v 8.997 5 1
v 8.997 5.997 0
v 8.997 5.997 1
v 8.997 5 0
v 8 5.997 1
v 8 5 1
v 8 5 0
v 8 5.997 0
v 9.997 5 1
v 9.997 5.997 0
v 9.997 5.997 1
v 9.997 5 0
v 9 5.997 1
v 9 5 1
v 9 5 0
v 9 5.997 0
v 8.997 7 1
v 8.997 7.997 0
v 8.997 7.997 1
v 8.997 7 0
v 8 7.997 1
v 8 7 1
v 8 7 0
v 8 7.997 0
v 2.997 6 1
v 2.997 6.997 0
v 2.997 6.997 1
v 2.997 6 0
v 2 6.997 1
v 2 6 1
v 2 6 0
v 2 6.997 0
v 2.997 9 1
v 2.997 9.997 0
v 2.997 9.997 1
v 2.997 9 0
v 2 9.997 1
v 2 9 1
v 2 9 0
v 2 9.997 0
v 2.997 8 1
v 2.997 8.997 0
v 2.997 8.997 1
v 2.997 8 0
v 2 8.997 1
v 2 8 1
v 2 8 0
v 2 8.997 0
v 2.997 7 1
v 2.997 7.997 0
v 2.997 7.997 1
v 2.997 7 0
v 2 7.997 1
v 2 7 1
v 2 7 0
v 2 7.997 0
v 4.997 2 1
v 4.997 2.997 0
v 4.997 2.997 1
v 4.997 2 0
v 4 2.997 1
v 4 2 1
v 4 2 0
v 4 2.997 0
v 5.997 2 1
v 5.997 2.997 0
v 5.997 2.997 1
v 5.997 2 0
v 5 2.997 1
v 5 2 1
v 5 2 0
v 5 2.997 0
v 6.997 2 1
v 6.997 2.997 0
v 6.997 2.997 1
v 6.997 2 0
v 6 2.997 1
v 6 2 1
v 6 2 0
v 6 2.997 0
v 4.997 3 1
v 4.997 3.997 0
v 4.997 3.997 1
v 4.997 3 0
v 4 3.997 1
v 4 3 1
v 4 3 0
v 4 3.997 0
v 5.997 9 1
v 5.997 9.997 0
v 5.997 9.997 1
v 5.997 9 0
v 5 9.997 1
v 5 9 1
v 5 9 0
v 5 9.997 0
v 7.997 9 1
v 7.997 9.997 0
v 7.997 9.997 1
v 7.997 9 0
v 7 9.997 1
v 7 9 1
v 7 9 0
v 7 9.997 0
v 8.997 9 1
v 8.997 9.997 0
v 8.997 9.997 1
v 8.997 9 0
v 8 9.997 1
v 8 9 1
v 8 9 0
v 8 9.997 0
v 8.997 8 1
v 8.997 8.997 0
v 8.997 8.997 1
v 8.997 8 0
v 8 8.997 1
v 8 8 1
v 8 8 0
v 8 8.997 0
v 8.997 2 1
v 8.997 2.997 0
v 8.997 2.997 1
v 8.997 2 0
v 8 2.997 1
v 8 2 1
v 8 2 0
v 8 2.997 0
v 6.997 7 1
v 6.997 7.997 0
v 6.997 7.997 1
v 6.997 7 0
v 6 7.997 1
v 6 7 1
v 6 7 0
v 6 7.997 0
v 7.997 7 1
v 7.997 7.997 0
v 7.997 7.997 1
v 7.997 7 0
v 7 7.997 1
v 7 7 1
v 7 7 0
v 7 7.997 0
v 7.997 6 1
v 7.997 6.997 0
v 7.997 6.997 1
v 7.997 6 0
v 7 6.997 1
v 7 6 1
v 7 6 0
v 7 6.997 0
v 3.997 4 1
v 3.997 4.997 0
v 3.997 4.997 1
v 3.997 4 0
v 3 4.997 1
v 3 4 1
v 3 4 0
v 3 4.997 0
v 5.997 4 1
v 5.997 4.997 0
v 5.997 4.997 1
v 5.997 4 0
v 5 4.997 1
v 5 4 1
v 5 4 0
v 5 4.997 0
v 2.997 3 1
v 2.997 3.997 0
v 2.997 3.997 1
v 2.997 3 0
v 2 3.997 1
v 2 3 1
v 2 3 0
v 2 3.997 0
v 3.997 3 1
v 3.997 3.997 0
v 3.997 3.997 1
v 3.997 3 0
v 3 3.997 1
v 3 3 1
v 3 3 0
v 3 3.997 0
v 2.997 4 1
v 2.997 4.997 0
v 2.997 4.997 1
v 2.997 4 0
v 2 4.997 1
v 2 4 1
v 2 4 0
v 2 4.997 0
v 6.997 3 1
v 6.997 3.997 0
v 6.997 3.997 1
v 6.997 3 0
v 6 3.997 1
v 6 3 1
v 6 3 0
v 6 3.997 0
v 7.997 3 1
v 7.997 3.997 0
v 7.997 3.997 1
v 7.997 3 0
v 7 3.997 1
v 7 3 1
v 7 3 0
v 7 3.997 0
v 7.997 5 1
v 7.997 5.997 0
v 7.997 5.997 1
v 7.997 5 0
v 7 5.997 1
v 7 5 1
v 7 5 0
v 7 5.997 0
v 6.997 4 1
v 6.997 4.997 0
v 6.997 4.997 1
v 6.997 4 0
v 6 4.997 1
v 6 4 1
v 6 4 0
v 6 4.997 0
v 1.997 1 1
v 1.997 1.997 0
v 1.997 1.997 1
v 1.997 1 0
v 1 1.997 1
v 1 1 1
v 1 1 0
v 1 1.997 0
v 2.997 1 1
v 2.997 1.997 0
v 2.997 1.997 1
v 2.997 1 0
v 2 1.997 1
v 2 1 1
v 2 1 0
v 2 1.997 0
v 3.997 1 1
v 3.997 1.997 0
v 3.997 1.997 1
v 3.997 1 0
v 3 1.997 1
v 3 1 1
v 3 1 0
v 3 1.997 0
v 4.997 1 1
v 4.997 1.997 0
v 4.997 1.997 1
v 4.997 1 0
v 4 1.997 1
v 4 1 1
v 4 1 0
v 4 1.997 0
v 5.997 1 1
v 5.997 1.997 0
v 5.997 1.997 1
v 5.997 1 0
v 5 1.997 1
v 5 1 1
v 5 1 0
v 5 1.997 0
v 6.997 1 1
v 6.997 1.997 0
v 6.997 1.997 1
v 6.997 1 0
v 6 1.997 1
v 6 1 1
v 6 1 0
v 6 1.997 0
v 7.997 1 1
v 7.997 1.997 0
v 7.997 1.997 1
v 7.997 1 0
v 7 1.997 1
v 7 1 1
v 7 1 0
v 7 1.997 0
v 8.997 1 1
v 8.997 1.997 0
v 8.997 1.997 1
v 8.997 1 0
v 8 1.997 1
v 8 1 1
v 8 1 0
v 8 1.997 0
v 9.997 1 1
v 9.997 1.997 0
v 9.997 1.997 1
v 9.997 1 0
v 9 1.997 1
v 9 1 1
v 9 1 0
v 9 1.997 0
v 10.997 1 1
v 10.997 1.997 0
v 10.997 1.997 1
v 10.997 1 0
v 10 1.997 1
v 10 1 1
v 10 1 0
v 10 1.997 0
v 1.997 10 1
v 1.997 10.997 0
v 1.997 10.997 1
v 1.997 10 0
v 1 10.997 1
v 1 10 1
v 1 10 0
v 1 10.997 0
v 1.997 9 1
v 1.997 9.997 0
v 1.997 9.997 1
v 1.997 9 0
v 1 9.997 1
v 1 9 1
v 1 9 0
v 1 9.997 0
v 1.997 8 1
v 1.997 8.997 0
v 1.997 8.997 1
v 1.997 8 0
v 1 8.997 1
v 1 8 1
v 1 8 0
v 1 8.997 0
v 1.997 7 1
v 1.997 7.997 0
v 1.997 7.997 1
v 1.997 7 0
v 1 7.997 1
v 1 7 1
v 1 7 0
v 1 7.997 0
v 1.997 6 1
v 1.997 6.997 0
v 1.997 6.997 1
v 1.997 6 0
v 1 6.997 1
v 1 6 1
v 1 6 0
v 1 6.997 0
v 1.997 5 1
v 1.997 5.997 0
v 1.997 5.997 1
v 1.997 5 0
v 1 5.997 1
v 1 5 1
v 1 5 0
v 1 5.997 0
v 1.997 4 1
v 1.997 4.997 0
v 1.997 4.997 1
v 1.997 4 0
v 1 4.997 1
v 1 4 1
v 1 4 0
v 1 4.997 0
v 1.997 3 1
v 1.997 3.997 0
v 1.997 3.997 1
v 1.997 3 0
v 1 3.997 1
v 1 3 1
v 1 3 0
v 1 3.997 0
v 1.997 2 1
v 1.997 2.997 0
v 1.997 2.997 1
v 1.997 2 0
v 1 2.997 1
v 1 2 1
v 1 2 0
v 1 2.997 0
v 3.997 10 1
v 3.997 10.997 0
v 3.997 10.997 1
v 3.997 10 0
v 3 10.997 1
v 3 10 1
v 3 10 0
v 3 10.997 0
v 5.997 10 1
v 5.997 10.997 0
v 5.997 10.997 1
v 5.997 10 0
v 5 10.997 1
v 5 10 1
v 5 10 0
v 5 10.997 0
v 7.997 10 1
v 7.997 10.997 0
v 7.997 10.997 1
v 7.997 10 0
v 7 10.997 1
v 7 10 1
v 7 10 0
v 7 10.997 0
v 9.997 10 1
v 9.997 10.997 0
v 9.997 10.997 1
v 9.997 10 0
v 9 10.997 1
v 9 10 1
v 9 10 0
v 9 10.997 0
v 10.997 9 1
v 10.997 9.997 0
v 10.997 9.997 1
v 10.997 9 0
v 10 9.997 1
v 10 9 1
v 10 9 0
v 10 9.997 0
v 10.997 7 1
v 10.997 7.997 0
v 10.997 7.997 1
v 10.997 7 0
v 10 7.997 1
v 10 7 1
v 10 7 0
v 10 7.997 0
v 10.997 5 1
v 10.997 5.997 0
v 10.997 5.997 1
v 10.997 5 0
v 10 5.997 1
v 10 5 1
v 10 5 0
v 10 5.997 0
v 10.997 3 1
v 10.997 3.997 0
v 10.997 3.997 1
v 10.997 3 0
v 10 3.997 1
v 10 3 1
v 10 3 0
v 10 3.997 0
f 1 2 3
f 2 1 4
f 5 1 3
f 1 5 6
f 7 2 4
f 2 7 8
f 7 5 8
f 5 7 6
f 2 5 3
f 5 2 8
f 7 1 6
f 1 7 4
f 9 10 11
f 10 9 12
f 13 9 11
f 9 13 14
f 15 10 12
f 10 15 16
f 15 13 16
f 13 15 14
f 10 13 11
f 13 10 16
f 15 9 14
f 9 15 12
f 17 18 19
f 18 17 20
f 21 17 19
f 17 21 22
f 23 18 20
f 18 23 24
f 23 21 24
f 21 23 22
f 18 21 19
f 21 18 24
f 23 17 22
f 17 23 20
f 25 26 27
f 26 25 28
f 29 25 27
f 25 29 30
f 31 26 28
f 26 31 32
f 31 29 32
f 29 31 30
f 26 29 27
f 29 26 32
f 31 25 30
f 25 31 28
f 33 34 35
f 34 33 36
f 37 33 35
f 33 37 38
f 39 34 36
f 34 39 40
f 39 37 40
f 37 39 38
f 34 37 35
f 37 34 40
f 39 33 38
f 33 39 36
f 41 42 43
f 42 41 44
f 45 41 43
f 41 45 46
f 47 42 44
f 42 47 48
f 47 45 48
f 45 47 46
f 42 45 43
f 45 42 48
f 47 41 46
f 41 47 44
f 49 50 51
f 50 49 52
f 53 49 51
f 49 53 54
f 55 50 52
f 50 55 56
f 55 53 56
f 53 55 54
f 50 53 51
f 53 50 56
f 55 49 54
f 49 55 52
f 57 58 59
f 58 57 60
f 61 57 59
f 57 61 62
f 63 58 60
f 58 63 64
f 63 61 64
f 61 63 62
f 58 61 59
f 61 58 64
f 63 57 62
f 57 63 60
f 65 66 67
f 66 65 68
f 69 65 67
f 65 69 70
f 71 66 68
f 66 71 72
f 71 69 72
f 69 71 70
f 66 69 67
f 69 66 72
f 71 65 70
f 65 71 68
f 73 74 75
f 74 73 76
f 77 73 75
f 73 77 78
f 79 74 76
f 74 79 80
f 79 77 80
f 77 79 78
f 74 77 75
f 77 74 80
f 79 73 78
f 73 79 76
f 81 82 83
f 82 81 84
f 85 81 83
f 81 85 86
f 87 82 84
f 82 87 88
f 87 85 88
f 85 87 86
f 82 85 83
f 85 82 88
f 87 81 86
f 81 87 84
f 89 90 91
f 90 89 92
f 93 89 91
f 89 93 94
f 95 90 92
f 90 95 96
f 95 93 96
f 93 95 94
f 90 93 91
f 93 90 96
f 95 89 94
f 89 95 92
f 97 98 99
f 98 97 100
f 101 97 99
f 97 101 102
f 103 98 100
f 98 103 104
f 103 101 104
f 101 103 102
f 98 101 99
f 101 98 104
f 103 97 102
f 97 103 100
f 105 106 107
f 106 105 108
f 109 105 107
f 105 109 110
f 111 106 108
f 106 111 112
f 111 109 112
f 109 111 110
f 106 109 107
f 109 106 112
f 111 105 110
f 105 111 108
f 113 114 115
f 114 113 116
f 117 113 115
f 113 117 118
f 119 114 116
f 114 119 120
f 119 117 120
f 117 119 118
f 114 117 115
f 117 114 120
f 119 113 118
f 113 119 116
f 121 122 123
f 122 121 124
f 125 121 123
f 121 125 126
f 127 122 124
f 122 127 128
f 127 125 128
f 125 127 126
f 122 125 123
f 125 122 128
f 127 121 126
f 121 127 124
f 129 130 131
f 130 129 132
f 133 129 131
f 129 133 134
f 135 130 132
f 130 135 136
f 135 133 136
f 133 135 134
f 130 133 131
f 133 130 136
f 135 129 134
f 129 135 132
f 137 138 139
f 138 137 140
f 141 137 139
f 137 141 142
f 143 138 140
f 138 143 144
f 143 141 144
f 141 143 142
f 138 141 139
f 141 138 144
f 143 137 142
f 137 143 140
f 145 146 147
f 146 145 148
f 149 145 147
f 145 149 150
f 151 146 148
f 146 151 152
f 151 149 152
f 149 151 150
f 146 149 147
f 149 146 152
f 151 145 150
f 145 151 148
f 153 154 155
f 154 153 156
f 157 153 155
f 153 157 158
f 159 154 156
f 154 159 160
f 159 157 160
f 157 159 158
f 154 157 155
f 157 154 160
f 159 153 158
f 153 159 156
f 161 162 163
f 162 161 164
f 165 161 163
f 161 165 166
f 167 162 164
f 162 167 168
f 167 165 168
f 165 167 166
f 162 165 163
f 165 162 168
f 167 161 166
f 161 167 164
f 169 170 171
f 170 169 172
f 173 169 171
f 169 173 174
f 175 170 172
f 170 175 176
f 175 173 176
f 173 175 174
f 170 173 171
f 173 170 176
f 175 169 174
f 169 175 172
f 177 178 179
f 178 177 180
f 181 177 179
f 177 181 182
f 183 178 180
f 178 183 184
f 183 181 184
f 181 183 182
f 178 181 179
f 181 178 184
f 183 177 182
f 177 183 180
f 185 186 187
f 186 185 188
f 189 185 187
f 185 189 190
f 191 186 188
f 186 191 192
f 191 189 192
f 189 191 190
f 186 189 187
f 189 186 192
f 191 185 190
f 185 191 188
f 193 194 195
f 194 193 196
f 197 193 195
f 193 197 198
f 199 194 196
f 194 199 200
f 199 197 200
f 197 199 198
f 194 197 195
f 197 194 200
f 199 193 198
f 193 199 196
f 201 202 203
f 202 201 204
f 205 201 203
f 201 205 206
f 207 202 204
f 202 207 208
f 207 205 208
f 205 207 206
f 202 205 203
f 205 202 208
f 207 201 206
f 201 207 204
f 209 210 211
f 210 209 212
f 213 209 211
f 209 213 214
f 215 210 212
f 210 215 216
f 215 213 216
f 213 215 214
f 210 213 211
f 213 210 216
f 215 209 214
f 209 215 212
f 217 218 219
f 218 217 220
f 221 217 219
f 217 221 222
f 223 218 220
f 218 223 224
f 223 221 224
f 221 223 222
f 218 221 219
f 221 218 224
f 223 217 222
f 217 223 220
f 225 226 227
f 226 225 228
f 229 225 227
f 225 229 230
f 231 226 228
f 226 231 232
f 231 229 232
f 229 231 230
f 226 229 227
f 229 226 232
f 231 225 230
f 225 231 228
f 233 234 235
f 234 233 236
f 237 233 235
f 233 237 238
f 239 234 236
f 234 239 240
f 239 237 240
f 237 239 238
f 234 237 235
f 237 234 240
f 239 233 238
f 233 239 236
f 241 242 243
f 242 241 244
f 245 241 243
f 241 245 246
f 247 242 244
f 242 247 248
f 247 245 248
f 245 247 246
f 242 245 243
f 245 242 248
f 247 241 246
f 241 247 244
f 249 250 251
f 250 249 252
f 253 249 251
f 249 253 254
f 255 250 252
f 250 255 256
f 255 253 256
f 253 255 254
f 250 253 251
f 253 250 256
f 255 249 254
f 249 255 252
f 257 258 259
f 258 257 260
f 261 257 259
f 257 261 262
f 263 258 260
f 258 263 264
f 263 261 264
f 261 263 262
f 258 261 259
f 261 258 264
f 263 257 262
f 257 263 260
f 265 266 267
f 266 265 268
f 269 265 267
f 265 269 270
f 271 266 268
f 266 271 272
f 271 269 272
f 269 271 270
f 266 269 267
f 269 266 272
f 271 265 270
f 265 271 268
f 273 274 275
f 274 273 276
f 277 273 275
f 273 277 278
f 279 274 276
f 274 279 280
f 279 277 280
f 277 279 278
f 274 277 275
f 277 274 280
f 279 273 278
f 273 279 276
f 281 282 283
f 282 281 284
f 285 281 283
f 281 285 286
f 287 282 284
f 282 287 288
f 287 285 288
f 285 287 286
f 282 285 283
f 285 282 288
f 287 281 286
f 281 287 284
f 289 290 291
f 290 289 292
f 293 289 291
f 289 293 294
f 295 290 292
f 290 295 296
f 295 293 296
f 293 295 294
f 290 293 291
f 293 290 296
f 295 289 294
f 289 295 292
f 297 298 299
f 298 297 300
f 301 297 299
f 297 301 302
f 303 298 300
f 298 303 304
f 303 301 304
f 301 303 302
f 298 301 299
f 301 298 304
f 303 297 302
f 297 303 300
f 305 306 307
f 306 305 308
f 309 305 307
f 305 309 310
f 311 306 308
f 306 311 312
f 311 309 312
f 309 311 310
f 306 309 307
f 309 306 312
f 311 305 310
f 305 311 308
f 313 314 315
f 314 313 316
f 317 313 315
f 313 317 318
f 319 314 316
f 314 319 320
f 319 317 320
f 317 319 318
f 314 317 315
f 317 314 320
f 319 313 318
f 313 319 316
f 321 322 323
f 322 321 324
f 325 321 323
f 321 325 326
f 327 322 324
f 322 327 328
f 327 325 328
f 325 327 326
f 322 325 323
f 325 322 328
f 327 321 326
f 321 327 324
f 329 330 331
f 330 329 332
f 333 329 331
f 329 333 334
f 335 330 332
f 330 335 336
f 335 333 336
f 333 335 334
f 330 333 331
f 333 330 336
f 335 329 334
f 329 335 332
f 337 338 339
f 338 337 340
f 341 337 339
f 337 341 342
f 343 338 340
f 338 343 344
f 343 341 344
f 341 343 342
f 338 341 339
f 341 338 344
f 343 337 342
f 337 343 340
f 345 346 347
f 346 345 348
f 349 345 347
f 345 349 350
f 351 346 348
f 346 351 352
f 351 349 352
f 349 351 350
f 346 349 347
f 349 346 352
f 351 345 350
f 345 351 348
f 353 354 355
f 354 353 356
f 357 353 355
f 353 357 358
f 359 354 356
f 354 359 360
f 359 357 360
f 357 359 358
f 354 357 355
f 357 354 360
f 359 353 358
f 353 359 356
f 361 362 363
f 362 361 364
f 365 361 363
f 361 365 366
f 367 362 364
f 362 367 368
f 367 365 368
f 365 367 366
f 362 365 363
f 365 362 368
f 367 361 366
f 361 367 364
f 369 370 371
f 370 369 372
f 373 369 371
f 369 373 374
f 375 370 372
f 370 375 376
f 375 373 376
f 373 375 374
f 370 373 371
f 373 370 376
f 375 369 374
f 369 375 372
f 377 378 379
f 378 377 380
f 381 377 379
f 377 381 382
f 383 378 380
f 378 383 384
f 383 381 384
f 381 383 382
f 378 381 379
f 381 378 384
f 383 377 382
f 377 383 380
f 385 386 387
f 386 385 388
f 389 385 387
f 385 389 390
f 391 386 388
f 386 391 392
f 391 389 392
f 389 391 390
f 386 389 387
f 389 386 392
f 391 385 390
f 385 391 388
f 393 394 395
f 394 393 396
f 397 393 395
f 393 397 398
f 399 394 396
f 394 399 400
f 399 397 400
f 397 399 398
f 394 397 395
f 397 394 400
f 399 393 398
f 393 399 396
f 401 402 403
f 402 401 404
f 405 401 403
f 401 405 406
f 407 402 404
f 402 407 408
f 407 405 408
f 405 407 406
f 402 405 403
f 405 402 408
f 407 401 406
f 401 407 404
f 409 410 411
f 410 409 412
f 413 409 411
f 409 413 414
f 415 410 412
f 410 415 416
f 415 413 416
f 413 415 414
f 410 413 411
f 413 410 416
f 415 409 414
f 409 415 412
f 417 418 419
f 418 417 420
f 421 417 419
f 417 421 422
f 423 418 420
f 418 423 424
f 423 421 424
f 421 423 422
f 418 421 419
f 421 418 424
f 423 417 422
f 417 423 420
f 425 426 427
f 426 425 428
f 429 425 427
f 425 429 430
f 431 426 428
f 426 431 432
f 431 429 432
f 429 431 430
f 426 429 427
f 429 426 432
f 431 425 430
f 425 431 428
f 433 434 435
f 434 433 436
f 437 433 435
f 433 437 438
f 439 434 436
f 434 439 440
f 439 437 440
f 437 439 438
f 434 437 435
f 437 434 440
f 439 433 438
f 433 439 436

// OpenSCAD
// file: ../../util/bitmap.scad
/*****************************************************************************
 * Module Bitmap Library
 * Modules to create bitmaps of unit squares from 1 or 2 dimensional vectors.
 *****************************************************************************
 * Copyright 2017 Chris Baker
 *
 * This program is free software: you can redistribute it and/or modify
 * it under the terms of the GNU Lesser General Public License as published by
 * the Free Software Foundation, either version 3 of the License, or
 * (at your option) any later version.
 *
 * This program is distributed in the hope that it will be useful,
 * but WITHOUT ANY WARRANTY; without even the implied warranty of
 * MERCHANTABILITY or FITNESS FOR A PARTICULAR PURPOSE.  See the
 * GNU Lesser General Public License for more details.
 *
 * You should have received a copy of the GNU Lesser General Public License
 * along with this program.  If not, see <http://www.gnu.org/licenses/>.
 *****************************************************************************
 * Usage:
 * Include this file with the "use" tag.
 * Depends on compat.scad library.
 *
 * API:
 *   1dbitmap(bitmap, center, pullback, vector_mode)
 *   2dbitmap(bitmap, center, pullback, vector_mode)
 *     Generate a 1 or 2-Dimensional field of modules based on the provided
 *     bitmap vector. See Bitmap Vectors below.
 *     The center flag determines whether to center the bitmap on the origin.
 *     The pullback value shrinks each module in the x and y dimension by the
 *     specified amount. A negative value will expand the modules so they
 *     blend into each other.
 *     The vector_mode flag determines whether to create 3D solid geometry
 *     (unit cubes) or 2D vector geometry (squares).
 *
 * Bitmap Vectors:
 *   The bitmap vectors primarily provide boolean information.
 *   A module will be placed where these vectors have a postive value and
 *   skipped where they have a negative value. I.E. 0, -1, false, and undef
 *   are all equivalent and result in a skip. 1 and true are equivalent and
 *   result in a placed 1-unit module.
 *   Further, if the value is an integer it will be treated as a height for
 *   the module, allowing z-maps to be created.
 *   If the value is not an integer or boolean, it will be treated as a color
 *   reference. This can be a string or RGBA vector that will be used to
 *   color the module in the OpenSCAD preview window.
 *   In current versions of OpenSCAD, the color has no effect in the rendered
 *   view or STL output.
 *
 * Vector Mode:
 *   Although OpenSCAD supports generating 2D geometry, there are several
 *   caveats:
 *   - 2D and 3D geometry cannot be mixed
 *   - Extruding 2D geometry causes color information to be lost
 *   - All 2D geometry is projected onto the XY plane when rendering
 *   - Rendering also results in loss of color (same as 3D)
 *   - The SVG exporter is somewhat limited:
 *     - The pixel size of the image is hard-coded in the file
 *     - The title of the image is a generic string
 *     - The color selection for stroke and fill is fixed
 *     - The stroke-width is set to a large value that will cause overlap
 *     - The background is transparent
 *     - Only one path element is created with all of the geometry; there is
 *       no easy way to split up the geometry into multiple logical units.
 *     - These issues can mostly be resolved by hand-editing the file:
 *       - Remove or modify the width and height parameters from the svg
 *         element at the top of the file to provide better scaling.
 *       - Edit the title element at the top of the file to change the title.
 *       - Edit the stroke and fill parameters of the path element (these will
 *         probably be at the end of the file).
 *       - Set the stroke-width parameter for the path element to 0.
 *****************************************************************************/
use <compat.scad>

/*
 * 2dbitmap - Turn a 2D vector into a bitmap of cubes
 *
 * bitmap - 2D vector representing where to place each cube
 *          Value can either be boolean, z-height, or color
 * center - center cubes around the origin
 * pullback - size of gap around each pixel (screendoor)
 * vector_mode - create a 2D vector drawing instead of 3D extrusion
 */
module 2dbitmap(bitmap=[[1,0],[0,1]], center=false, pullback=0.003, vector_mode=false)
{
  if (bitmap!=undef) {
	ylen=len(bitmap)-1;

	for (y=[0:ylen]) {
		xlen=len(bitmap[y])-1;
		for (x=[0:xlen])
			translate([x-(center?xlen/2:0),ylen-y-(center?ylen/2:0),0])
				if (is_indexable(bitmap[y][x]))
					color(bitmap[y][x])
						if (vector_mode)
							square([1-pullback,1-pullback], center=center);
						else
							cube([1-pullback,1-pullback,1], center=center);
				else
					if (bitmap[y][x])
						if (vector_mode)
							square([1-pullback,1-pullback], center=center);
						else
							cube([1-pullback,1-pullback,clamp_nonnum(bitmap[y][x])], center=center);
	}
  }
}

module 1dbitmap(bitmap=[1,0,1,0,1], center=false, pullback=-0.003, vector_mode=false)
	if (bitmap!=undef)
		2dbitmap([bitmap], center, pullback, vector_mode);

/*
 * Examples
 */

// 1D with z-height
translate([10,0,0]) scale([1,10,1])
	1dbitmap(bitmap=[1,1,0,2,0,0,3], pullback=.1);

// 1D with boolean
translate([-20,0,0]) scale([1,10,1])
	1dbitmap(bitmap=[true,false,true,false,true,true]);

// 2D with z-height
scale([2,2,1])
	2dbitmap(bitmap=[[1,0,2,1],[0,3,3,0],[1,1,0,1]],
		center=true);

// 1D with color
translate([0,-10,0]) scale([1,3,1])
	1dbitmap(bitmap=["red","white","blue",[0,0.3,0,0.5]]);

// 1D with color using 2D-vector-mode
translate([-7,-8,0]) scale([1,2])
	1dbitmap(bitmap=["red",0,"blue",0,"green"], vector_mode=true);
translate([-4.5,-10,0]) scale([1,2])
	1dbitmap(bitmap=["red",0,"blue",0,"green"], vector_mode=true, center=true);

// Check behavior with undef
1dbitmap(undef);
2dbitmap(undef);
// file: ../../util/bitlib.scad
/*****************************************************************************
 * Bit Manipulation Library
 * Provides some useful bit manipulation functions.
 *****************************************************************************
 * Copyright 2017 Chris Baker
 *
 * This program is free software: you can redistribute it and/or modify
 * it under the terms of the GNU Lesser General Public License as published by
 * the Free Software Foundation, either version 3 of the License, or
 * (at your option) any later version.
 *
 * This program is distributed in the hope that it will be useful,
 * but WITHOUT ANY WARRANTY; without even the implied warranty of
 * MERCHANTABILITY or FITNESS FOR A PARTICULAR PURPOSE.  See the
 * GNU Lesser General Public License for more details.
 *
 * You should have received a copy of the GNU Lesser General Public License
 * along with this program.  If not, see <http://www.gnu.org/licenses/>.
 *****************************************************************************
 * Usage:
 * Include this file with the "use" tag.
 * When run on its own, all echo statements in this library should print
 * "true".
 *
 * API:
 *   bit(v,b)
 *     Return the truth value of the b'th bit of v.
 *
 *   check_bit_size(v,b,signed=false)
 *     Determine whether the value v can be represented with b bits (b must
 *     be positive).
 *     The signed flag indicates whether to include the sign bit in the
 *     determination; otherwise negative values will result in undef being
 *     returned.
 *
 *   xor(a,b)
 *     Return the value of a xor b.
 *     Handles arbitrary size values for a and b.
 *     Handles negative values as expected (a positive result will be returned
 *     unless a and b have differing signs).
 *
 * TODO:
 *  - Change echos to asserts (future OpenSCAD version)
 *  - Add more functions
 *
 *****************************************************************************/

//Return the truth value of the b'th bit of v
function bit(v,b) =
	((v==undef)||(b==undef)||(b<0))?undef:
	(floor(v / pow(2, b)) % 2)?true:false;

echo("*** bit() testcases ***");
echo(0,bit(0,0)==false);
echo(1,bit(-1,0)==true);
echo(2,bit(1,0)==true);
echo(3,[for (i=[0:63]) bit(0,i)]==[for (i=[0:63]) false]); //0=0...0
echo(4,[for (i=[0:63]) bit(-1,i)]==[for (i=[0:63]) true]); //-1=1...1
echo(5,[for (i=[1:63]) bit(1,i)]==[for (i=[1:63]) false]); //1=0...01
echo(6,[for (i=[0:7]) bit(85,i)?1:0]==[1,0,1,0,1,0,1,0]); //85=01010101
echo(7,[for (i=[0:7]) bit(170,i)?1:0]==[0,1,0,1,0,1,0,1]); //170=10101010
echo(8,[for (i=[0:7]) bit(165,i)?1:0]==[1,0,1,0,0,1,0,1]); //165=10100101
echo(9,[for (i=[0:7]) bit(56,i)?1:0]==[0,0,0,1,1,1,0,0]); //56=00111000
echo(10,[for (i=[0:7]) bit(-3,i)?1:0]==[1,0,1,1,1,1,1,1]); //-3=1...101
//(2^64)=0...01 0...0
echo(11,bit(pow(2,64),64)==true);
echo(12,[for (i=[0:63]) bit(pow(2,64),i)]==[for (i=[0:63]) false]);
echo(13,[for (i=[65:127]) bit(pow(2,64),i)]==[for (i=[1:63]) false]);
//-(2^64)=1...1 0...0
echo(14,[for (i=[0:63]) bit(-pow(2,64),i)]==[for (i=[0:63]) false]);
echo(15,[for (i=[64:127]) bit(-pow(2,64),i)]==[for (i=[0:63]) true]);
echo(16,bit(10,-1)==undef);
echo(17,bit(10,undef)==undef);
echo(18,bit(undef,3)==undef);

//return true if v can be represented in b bits
//if signed flag is set. the result will be adjusted
//to account for the needed sign bit
function check_bit_size(v,b,signed=false) =
	(b<0)?undef:
	(v==undef)?undef:
	(b==0)?false:
	(v==0)?true: //(b>0)
	(signed)?
		(v<0)?(-pow(2,b-1)<(v+1)):
			(pow(2,b-1)>(v+1)):
		(v<0)?undef:
			(pow(2,b)>v);

echo("*** check_bit_size() testcases ***");
echo(0,check_bit_size(-1,2)==undef);
echo(1,check_bit_size(2,-4)==undef);
echo(2,check_bit_size(2,-4,signed=true)==undef);
echo(3,check_bit_size(0,0)==false);
echo(4,check_bit_size(0,1)==true);
echo(5,check_bit_size(1,0)==false);
echo(6,check_bit_size(1,1)==true);
echo(7,check_bit_size(7,3)==true);
echo(8,check_bit_size(8,3)==false);
echo(9,check_bit_size(1,3)==true);
echo(10,check_bit_size(256,8)==false);
echo(11,check_bit_size(255,8)==true);
echo(12,check_bit_size(10,2)==false);
echo(13,check_bit_size(10,4)==true);
echo(14,check_bit_size(-10,2,signed=true)==false);
echo(15,check_bit_size(-10,4,signed=true)==false);
echo(16,check_bit_size(-10,5,signed=true)==true);
echo(17,check_bit_size(-1,0,signed=true)==false);
echo(18,check_bit_size(-1,1,signed=true)==true);
echo(19,check_bit_size(0,0,signed=true)==false);
echo(20,check_bit_size(0,1,signed=true)==true);
echo(21,check_bit_size(-2,2,signed=true)==true);
echo(22,check_bit_size(-3,2,signed=true)==false);
echo(23,check_bit_size(-3,3,signed=true)==true);
echo(24,check_bit_size(-8,3,signed=true)==false);
echo(25,check_bit_size(-8,4,signed=true)==true);
echo(26,check_bit_size(undef,4)==undef);
echo(27,check_bit_size(undef,4,signed=true)==undef);

//return the value of a xor b
//runs recursively until all bits of a and b are exhausted
function xor(a,b,i=0) =
	((a==undef)||(b==undef))?undef:
	let (c=bit(a,i), d=bit(b,i),
		 v=((c||d) && !(c&&d))?pow(2,i):0)
		(check_bit_size(a,i,signed=true) &&
		 check_bit_size(b,i,signed=true))?
			-v: //special case for sign bit
			v+xor(a,b,i+1); //recursively add powers of 2

echo("*** xor() testcases ***");
echo(0,xor(42,0)==42);
echo(1,xor(42,42)==0);
echo(2,xor(169,238)==71); //10101001^11101110=01000111=71
echo(3,xor(238,169)==71);
echo(4,xor(42,238)==196); //00101010^11101110=11000100=196
echo(5,xor(169,42)==131); //10101001^00101010=10000011=131
echo(6,xor(-8,-10)==14); //11000^10110=01110=14
echo(7,xor(-7,-10)==15); //11001^10110=01111=15
echo(8,xor(9,-10)==-1); //01001^10110=11111=-1
echo(9,xor(9,-12)==-3); //01001^10100=11101=-3
echo(10,xor(undef,0)==undef);
// file: ../../util/stringlib.scad
/*****************************************************************************
 * String Manipulation Library
 * Provides some useful string manipulation functions.
 *****************************************************************************
 * Copyright 2017 Chris Baker
 *
 * This program is free software: you can redistribute it and/or modify
 * it under the terms of the GNU Lesser General Public License as published by
 * the Free Software Foundation, either version 3 of the License, or
 * (at your option) any later version.
 *
 * This program is distributed in the hope that it will be useful,
 * but WITHOUT ANY WARRANTY; without even the implied warranty of
 * MERCHANTABILITY or FITNESS FOR A PARTICULAR PURPOSE.  See the
 * GNU Lesser General Public License for more details.
 *
 * You should have received a copy of the GNU Lesser General Public License
 * along with this program.  If not, see <http://www.gnu.org/licenses/>.
 *****************************************************************************
 * Usage:
 * Include this file with the "use" tag.
 * Depends on compat.scad library.
 *
 * API:
 *   atoi(a)
 *     Convert the string of numerals, a, to a vector of individual decimal
 *     numbers.
 *
 *   ascii_to_vec(a)
 *     Convert the ASCII string, a, into a vector of decimal numbers.
 *
 *****************************************************************************/
use <compat.scad>

/*
 * atoi - convert ASCII numerals to a vector of individual decimal numbers
 *
 * a - the ASCII string of numerals
 */
function atoi(a) = (isa_string(a))?
	[
		let (val = search(a, "0123456789"))
			for (i = val) i
	]
	:
	undef;

/* *** atoi() testcases *** */
do_assert(atoi(undef)==undef,     "atoi test 00");
do_assert(atoi(true)==undef,      "atoi test 01");
do_assert(atoi(false)==undef,     "atoi test 02");
do_assert(atoi([])==undef,        "atoi test 03");
do_assert(atoi([1,2,3])==undef,   "atoi test 04");
do_assert(atoi("")==[],           "atoi test 05");
do_assert(atoi("0")==[0],         "atoi test 06");
do_assert(atoi("1")==[1],         "atoi test 07");
do_assert(atoi("2")==[2],         "atoi test 08");
do_assert(atoi("3")==[3],         "atoi test 09");
do_assert(atoi("4")==[4],         "atoi test 10");
do_assert(atoi("5")==[5],         "atoi test 11");
do_assert(atoi("6")==[6],         "atoi test 12");
do_assert(atoi("7")==[7],         "atoi test 13");
do_assert(atoi("8")==[8],         "atoi test 14");
do_assert(atoi("9")==[9],         "atoi test 15");
do_assert(atoi("123")==[1,2,3],   "atoi test 16");
do_assert(atoi("1a23b")==[1,2,3], "atoi test 17"); //degenerate case, don't really care too much about the result

/*
 * ascii_to_vec - convert ASCII string to decimal vector
 *
 * a - the ASCII string to vectorize
 */
function ascii_to_vec(a) = (isa_string(a))?
	[
		let (val = search(a, "\x01\x02\x03\x04\x05\x06\x07\x08\x09\x0a\x0b\x0c\x0d\x0e\x0f\x10\x11\x12\x13\x14\x15\x16\x17\x18\x19\x1a\x1b\x1c\x1d\x1e\x1f !\"#$%&'()*+,-./0123456789:;<=>?@ABCDEFGHIJKLMNOPQRSTUVWXYZ[\\]^_`abcdefghijklmnopqrstuvwxyz{|}~\x7f"))
			for (i = val) i+1
	]:
	undef;

/* *** ascii_to_vec() testcases *** */
do_assert(ascii_to_vec(undef)==undef,   "ascii_to_vec test 01");
do_assert(ascii_to_vec(true)==undef,    "ascii_to_vec test 02");
do_assert(ascii_to_vec(false)==undef,   "ascii_to_vec test 03");
do_assert(ascii_to_vec([])==undef,      "ascii_to_vec test 04");
do_assert(ascii_to_vec([1,2,3])==undef, "ascii_to_vec test 05");
do_assert(ascii_to_vec("")==[],         "ascii_to_vec test 06");
do_assert(ascii_to_vec("0")==[48],      "ascii_to_vec test 07");
do_assert(ascii_to_vec("a")==[97],      "ascii_to_vec test 08");
do_assert(ascii_to_vec("0123456789")==[48,49,50,51,52,53,54,55,56,57],
	"ascii_to_vec test 09");
do_assert(ascii_to_vec("The quick brown fox jumped over the lazy dog.")
	==[84,104,101,32,113,117,105,99,107,32,98,114,111,119,110,32,102,111,120,32,106,117,109,112,101,100,32,111,118,101,114,32,116,104,101,32,108,97,122,121,32,100,111,103,46],
	"ascii_to_vec test 10");
// main file
/* Unit Test 01: 10x10 - 3 data bytes, 5 ecc bytes - expert_mode example */
use <../datamatrix.scad>
data_matrix(
	concat(
		dm_ascii("123456"),
		[114,25,5,88,102]
	),
	mark="black", expert_mode=true);
